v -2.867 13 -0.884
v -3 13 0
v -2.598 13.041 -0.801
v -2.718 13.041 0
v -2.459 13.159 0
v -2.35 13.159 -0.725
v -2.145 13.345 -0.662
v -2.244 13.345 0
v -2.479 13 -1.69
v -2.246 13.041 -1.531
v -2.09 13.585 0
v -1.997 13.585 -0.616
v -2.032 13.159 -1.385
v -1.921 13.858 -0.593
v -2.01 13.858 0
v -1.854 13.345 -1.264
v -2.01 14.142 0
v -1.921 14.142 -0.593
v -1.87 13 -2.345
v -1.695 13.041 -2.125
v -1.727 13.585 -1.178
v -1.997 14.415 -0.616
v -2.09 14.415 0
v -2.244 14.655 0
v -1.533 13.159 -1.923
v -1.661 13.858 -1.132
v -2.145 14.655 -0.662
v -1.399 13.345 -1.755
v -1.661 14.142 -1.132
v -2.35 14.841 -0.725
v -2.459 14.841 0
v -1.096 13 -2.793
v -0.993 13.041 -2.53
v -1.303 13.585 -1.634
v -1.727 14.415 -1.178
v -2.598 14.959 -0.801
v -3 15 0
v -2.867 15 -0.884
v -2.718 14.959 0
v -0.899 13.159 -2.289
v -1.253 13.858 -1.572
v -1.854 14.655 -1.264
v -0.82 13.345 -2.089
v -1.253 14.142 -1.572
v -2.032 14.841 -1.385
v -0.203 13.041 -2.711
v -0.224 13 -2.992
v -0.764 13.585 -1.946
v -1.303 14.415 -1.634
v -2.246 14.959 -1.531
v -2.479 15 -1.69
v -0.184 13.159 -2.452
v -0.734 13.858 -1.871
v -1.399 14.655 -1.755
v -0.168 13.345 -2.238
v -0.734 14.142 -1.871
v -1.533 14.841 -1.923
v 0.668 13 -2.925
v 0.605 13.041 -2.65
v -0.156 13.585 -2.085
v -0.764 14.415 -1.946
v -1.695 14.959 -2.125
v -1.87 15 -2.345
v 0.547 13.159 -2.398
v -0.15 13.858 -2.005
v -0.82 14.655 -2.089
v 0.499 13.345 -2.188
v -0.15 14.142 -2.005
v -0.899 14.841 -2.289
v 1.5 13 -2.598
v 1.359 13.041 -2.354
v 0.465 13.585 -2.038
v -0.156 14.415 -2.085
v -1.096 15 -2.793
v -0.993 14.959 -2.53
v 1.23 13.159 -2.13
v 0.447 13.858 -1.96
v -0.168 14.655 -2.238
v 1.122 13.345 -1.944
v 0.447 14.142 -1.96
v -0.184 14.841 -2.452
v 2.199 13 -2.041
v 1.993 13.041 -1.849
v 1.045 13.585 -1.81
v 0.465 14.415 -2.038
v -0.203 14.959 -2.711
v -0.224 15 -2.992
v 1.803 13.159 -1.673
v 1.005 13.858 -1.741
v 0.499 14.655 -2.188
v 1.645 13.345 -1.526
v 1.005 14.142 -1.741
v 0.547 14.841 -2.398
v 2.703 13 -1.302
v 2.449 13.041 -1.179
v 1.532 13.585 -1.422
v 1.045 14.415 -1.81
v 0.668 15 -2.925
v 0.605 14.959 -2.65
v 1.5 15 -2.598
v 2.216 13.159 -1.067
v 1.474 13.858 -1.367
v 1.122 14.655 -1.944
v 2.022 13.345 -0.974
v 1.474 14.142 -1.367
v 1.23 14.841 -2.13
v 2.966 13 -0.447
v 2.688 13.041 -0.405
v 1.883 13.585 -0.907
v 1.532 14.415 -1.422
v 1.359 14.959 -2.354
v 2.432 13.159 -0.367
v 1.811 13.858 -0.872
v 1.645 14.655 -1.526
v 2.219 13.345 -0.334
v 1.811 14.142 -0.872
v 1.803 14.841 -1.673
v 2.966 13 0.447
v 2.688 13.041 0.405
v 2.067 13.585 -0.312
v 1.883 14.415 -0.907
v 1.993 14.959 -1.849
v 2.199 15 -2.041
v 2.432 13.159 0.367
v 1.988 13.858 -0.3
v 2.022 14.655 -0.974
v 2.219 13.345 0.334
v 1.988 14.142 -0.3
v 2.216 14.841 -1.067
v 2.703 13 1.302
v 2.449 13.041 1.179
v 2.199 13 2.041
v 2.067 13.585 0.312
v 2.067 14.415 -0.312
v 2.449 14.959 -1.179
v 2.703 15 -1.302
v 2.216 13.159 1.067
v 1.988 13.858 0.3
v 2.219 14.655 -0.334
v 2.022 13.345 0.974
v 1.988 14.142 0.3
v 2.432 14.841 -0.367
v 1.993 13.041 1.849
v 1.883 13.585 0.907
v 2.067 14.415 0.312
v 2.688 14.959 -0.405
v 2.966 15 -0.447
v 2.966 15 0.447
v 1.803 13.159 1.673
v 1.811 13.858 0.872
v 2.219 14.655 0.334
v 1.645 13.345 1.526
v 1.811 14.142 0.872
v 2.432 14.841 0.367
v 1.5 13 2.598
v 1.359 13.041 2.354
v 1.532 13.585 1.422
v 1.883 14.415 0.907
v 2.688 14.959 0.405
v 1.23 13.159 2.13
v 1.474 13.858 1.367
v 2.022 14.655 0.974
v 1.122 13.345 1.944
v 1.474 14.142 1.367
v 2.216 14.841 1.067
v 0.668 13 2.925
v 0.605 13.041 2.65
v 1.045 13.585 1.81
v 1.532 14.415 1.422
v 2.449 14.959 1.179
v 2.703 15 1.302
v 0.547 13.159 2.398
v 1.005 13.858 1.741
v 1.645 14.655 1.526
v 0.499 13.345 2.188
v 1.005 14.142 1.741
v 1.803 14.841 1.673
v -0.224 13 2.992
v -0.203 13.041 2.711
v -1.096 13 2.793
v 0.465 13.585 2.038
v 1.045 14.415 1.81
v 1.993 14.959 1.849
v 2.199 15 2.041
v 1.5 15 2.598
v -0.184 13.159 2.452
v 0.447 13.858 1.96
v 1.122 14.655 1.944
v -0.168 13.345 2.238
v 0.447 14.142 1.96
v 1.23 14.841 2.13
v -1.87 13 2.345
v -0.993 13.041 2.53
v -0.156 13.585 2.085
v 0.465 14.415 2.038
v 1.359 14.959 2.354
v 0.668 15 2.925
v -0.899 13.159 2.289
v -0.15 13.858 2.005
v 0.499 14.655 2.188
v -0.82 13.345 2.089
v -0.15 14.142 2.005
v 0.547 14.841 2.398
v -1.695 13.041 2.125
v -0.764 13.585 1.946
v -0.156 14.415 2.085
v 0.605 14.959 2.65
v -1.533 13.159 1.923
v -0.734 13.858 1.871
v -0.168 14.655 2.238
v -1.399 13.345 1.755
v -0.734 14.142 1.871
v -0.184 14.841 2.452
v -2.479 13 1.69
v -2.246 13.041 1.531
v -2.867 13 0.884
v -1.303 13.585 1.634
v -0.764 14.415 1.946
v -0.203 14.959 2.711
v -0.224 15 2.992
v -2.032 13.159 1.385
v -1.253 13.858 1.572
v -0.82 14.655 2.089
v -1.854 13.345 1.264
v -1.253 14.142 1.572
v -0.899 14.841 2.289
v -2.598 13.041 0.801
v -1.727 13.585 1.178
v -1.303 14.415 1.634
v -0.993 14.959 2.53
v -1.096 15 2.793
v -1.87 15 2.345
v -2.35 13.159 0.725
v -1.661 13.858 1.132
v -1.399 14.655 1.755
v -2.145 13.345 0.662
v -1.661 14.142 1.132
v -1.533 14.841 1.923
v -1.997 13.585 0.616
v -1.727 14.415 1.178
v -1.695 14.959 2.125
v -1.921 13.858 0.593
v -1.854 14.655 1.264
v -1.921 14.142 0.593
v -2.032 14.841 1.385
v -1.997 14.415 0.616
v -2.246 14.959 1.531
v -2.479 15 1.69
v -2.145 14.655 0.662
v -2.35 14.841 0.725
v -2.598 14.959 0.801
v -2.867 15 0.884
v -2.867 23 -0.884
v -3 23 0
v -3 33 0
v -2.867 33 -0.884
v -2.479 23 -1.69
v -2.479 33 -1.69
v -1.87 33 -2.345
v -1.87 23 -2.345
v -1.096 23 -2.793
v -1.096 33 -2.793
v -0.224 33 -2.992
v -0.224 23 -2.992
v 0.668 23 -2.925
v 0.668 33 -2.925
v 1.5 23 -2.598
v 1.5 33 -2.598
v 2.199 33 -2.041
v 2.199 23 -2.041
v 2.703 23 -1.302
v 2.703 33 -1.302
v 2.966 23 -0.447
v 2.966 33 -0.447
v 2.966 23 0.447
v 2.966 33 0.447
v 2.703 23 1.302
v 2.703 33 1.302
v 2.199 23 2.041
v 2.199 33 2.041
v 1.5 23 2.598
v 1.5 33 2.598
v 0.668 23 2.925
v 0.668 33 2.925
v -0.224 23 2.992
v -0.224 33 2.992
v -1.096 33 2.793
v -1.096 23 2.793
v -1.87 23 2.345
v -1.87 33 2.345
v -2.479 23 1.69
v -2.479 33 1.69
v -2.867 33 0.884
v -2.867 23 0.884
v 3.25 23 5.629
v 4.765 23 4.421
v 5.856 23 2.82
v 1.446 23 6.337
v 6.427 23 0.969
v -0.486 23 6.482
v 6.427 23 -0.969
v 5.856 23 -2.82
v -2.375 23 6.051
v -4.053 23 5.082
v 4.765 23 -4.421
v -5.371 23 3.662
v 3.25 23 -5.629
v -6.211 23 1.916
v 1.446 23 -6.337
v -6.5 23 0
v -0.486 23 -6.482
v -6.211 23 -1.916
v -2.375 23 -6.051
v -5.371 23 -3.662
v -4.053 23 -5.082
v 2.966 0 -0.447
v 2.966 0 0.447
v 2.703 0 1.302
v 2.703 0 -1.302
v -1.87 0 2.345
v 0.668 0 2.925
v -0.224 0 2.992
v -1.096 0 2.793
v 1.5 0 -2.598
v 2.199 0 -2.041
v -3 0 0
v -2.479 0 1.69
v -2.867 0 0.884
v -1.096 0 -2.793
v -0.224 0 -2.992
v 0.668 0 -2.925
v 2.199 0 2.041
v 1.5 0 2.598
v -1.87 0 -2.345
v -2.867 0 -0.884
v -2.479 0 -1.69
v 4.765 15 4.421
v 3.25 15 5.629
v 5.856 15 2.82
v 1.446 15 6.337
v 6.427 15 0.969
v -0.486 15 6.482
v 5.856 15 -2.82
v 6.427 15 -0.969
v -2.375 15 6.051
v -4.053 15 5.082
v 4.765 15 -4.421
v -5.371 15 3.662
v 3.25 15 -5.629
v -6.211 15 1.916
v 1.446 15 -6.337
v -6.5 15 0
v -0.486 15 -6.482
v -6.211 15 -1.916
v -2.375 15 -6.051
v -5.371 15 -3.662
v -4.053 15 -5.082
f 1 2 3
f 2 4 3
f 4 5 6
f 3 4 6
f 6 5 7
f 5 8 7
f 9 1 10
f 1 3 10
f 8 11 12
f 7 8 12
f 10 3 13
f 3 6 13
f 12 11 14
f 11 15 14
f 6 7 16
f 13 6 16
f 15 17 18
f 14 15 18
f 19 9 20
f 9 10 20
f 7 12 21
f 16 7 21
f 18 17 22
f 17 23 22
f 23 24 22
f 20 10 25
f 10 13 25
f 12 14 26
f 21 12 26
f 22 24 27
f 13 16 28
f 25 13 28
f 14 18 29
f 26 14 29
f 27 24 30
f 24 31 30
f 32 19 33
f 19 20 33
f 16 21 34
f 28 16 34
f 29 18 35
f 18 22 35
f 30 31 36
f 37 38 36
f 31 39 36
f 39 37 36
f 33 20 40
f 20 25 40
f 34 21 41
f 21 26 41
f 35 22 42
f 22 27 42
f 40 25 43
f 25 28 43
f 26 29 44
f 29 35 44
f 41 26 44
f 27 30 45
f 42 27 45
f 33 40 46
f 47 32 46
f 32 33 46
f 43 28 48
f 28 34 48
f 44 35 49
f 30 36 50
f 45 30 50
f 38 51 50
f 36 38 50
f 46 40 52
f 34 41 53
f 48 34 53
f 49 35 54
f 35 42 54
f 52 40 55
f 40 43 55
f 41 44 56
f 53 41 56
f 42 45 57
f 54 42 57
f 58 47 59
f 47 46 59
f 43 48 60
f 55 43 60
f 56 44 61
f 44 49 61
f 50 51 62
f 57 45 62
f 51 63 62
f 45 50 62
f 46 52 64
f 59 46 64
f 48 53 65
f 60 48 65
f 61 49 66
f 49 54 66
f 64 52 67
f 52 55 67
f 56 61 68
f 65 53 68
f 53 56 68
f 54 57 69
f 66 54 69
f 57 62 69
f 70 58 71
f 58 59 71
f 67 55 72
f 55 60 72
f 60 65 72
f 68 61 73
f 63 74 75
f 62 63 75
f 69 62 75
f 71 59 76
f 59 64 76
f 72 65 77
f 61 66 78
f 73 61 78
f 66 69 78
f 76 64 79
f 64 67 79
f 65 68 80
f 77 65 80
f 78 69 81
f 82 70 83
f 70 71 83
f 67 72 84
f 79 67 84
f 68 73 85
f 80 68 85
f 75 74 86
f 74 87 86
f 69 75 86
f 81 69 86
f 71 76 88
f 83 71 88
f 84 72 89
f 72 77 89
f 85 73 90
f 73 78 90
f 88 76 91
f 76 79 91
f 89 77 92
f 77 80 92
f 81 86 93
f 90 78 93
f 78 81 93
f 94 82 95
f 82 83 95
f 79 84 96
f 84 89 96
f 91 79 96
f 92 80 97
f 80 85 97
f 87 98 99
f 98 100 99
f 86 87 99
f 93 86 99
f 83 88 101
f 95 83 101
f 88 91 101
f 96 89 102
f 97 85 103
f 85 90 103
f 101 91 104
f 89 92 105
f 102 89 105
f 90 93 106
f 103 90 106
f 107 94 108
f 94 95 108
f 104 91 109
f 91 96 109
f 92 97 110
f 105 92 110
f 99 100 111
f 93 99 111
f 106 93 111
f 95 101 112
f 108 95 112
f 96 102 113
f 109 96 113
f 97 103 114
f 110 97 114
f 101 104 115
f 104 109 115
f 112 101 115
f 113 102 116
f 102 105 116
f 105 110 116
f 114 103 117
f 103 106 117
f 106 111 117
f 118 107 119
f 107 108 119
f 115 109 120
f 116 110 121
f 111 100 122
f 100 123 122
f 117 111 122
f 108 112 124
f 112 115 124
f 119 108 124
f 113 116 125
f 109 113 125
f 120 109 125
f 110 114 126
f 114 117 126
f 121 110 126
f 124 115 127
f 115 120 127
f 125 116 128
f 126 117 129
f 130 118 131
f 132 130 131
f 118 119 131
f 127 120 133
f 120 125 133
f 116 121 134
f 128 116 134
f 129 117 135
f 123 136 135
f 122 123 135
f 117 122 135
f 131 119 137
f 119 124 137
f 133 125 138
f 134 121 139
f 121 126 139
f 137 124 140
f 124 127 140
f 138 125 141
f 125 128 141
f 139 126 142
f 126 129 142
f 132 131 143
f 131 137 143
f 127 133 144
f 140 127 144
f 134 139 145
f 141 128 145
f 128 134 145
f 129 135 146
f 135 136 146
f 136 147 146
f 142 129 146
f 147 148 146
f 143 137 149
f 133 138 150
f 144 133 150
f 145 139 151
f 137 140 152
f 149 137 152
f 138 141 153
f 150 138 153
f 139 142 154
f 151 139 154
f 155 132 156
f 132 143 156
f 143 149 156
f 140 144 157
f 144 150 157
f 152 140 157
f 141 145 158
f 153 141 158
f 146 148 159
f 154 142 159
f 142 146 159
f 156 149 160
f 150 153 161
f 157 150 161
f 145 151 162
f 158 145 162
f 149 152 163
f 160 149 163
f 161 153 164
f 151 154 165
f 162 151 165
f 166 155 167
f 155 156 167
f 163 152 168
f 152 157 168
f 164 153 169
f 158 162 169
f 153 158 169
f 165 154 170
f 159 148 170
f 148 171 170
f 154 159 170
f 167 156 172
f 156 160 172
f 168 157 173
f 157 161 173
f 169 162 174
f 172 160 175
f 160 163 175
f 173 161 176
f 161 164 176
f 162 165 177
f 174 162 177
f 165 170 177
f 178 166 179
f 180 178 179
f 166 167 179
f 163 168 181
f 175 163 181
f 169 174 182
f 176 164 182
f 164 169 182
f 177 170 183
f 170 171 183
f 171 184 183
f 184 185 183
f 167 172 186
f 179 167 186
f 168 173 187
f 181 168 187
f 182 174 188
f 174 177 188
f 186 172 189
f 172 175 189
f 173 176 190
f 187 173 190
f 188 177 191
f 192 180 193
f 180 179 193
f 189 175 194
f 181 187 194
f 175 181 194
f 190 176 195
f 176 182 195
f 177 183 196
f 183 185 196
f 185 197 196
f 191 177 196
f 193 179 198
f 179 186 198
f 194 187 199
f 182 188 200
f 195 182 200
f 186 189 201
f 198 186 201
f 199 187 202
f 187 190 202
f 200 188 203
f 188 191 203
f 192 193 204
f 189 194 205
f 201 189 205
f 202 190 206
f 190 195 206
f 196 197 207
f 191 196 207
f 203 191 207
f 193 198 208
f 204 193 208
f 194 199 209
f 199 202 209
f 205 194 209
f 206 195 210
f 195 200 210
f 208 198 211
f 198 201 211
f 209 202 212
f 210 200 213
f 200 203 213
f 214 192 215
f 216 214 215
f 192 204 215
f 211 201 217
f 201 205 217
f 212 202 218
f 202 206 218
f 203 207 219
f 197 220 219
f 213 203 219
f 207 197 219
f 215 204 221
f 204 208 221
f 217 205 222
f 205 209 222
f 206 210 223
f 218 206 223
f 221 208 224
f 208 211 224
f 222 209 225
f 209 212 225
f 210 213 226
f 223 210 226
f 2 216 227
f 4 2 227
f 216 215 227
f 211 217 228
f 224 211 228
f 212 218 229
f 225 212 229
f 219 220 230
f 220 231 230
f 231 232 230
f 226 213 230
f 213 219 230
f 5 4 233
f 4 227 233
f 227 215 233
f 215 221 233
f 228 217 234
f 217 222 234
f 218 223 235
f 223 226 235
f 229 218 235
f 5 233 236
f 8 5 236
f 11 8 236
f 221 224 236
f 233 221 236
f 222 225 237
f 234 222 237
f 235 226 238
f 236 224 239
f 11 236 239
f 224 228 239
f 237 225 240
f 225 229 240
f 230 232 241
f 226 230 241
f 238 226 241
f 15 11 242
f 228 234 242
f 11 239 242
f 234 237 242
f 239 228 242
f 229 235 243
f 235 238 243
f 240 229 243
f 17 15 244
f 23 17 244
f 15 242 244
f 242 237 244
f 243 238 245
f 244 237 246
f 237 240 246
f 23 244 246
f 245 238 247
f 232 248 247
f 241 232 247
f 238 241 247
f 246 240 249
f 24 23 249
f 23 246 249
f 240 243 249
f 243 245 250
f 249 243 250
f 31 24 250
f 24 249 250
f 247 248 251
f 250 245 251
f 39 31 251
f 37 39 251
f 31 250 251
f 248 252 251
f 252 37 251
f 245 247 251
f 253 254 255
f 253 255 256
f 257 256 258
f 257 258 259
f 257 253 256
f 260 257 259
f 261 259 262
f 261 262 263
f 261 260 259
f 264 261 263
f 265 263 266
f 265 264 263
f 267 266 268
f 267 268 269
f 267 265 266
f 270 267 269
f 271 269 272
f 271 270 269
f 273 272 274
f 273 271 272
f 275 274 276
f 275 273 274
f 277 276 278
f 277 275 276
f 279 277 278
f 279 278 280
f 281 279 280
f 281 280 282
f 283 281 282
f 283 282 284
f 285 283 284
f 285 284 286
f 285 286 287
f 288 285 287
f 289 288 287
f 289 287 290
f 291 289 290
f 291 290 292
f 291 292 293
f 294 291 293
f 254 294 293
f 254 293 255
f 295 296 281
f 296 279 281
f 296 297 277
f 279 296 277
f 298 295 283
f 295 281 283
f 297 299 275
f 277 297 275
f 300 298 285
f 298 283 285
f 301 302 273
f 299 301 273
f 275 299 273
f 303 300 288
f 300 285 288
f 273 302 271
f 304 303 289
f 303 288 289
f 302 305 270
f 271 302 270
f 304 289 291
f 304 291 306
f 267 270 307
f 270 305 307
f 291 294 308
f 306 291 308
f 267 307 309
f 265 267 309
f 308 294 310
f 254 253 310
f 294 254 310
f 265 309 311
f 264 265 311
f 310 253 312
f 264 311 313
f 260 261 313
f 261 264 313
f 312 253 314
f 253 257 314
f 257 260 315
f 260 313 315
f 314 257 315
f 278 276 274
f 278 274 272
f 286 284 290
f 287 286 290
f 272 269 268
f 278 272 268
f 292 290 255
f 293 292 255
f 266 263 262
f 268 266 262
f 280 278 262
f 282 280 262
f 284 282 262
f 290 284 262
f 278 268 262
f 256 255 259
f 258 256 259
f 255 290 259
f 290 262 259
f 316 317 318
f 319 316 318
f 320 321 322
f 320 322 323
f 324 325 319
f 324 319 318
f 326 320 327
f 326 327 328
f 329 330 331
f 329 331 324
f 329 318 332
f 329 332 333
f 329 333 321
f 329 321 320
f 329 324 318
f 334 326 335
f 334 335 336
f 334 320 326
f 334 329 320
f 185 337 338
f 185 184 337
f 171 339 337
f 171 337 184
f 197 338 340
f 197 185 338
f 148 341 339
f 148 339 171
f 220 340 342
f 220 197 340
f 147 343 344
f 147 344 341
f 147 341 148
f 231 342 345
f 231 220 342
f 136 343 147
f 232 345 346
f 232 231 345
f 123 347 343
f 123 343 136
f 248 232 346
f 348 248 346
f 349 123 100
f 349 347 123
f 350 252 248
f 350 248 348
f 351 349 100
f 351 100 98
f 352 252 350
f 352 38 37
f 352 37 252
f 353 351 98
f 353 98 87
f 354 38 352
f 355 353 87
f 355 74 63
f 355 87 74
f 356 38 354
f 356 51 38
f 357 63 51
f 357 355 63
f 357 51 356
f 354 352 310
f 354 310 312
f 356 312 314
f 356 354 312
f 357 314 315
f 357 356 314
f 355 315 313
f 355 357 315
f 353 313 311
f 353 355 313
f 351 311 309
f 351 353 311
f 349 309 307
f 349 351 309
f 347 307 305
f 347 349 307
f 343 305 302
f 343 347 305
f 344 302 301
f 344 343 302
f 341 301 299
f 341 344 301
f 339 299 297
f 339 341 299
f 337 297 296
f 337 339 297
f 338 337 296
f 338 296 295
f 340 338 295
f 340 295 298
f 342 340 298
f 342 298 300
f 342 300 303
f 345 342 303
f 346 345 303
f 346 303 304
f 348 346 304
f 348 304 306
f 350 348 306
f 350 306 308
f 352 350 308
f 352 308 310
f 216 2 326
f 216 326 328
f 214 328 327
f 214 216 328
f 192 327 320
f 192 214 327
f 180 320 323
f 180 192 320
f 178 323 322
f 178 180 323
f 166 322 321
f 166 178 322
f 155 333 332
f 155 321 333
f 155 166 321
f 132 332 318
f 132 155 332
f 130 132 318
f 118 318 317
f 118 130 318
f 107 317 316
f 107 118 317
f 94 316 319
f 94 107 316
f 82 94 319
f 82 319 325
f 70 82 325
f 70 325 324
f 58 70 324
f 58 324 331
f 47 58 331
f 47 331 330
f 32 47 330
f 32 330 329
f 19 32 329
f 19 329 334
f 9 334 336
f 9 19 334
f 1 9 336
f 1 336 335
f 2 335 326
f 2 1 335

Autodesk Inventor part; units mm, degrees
ref_plane "YZ Plane" through (0, 0, 0) normal (1, 0, 0) x (0, 1, 0)
ref_plane "XZ Plane" through (0, 0, 0) normal (0, 1, 0) x (-1, 0, 0)
ref_plane "XY Plane" through (0, 0, 0) normal (0, 0, 1) x (1, 0, 0)
sketch "Boceto1" plane through (0, 0, 0) normal (0, 0, 1) x (1, 0, 0)
  line L0 (0, 33) -> (-3, 33)
  line L1 (-3, 33) -> (-3, 23)
  line L2 (-3, 23) -> (-6.5, 23)
  line L3 (-6.5, 23) -> (-6.5, 15)
  line L4 (-6.5, 15) -> (-3, 15)
  line L5 (0, 0) -> (-3, 0)
  line L6 (0, 33) -> (0, 0)
  line L7 (-3, 0) -> (-3, 13)
  arc A0 (-3, 13) -> (-3, 15) centre (-3, 14) ccw
  line L8 (-3, 14) -> (-3, 13) construction
  dimension "d0" = 33
  dimension "d2" = 3
  dimension "d3" = 3
  dimension "d6" = 6.5
  dimension "d7" = 13
  dimension "d8" = 10
  dimension "d9" = 15
revolve "Revolución1" add sketch "Boceto1" angle 360 about axis through (0, 33, 0) along (0, -1, 0)
thread "Rosca1" size "M6x1" class "6g" standard "ANSI Metric M Profile" length 13
thread "Rosca2" size "M6x1" class "6g" standard "ANSI Metric M Profile" length 8
properties part number "sensor_tension"
